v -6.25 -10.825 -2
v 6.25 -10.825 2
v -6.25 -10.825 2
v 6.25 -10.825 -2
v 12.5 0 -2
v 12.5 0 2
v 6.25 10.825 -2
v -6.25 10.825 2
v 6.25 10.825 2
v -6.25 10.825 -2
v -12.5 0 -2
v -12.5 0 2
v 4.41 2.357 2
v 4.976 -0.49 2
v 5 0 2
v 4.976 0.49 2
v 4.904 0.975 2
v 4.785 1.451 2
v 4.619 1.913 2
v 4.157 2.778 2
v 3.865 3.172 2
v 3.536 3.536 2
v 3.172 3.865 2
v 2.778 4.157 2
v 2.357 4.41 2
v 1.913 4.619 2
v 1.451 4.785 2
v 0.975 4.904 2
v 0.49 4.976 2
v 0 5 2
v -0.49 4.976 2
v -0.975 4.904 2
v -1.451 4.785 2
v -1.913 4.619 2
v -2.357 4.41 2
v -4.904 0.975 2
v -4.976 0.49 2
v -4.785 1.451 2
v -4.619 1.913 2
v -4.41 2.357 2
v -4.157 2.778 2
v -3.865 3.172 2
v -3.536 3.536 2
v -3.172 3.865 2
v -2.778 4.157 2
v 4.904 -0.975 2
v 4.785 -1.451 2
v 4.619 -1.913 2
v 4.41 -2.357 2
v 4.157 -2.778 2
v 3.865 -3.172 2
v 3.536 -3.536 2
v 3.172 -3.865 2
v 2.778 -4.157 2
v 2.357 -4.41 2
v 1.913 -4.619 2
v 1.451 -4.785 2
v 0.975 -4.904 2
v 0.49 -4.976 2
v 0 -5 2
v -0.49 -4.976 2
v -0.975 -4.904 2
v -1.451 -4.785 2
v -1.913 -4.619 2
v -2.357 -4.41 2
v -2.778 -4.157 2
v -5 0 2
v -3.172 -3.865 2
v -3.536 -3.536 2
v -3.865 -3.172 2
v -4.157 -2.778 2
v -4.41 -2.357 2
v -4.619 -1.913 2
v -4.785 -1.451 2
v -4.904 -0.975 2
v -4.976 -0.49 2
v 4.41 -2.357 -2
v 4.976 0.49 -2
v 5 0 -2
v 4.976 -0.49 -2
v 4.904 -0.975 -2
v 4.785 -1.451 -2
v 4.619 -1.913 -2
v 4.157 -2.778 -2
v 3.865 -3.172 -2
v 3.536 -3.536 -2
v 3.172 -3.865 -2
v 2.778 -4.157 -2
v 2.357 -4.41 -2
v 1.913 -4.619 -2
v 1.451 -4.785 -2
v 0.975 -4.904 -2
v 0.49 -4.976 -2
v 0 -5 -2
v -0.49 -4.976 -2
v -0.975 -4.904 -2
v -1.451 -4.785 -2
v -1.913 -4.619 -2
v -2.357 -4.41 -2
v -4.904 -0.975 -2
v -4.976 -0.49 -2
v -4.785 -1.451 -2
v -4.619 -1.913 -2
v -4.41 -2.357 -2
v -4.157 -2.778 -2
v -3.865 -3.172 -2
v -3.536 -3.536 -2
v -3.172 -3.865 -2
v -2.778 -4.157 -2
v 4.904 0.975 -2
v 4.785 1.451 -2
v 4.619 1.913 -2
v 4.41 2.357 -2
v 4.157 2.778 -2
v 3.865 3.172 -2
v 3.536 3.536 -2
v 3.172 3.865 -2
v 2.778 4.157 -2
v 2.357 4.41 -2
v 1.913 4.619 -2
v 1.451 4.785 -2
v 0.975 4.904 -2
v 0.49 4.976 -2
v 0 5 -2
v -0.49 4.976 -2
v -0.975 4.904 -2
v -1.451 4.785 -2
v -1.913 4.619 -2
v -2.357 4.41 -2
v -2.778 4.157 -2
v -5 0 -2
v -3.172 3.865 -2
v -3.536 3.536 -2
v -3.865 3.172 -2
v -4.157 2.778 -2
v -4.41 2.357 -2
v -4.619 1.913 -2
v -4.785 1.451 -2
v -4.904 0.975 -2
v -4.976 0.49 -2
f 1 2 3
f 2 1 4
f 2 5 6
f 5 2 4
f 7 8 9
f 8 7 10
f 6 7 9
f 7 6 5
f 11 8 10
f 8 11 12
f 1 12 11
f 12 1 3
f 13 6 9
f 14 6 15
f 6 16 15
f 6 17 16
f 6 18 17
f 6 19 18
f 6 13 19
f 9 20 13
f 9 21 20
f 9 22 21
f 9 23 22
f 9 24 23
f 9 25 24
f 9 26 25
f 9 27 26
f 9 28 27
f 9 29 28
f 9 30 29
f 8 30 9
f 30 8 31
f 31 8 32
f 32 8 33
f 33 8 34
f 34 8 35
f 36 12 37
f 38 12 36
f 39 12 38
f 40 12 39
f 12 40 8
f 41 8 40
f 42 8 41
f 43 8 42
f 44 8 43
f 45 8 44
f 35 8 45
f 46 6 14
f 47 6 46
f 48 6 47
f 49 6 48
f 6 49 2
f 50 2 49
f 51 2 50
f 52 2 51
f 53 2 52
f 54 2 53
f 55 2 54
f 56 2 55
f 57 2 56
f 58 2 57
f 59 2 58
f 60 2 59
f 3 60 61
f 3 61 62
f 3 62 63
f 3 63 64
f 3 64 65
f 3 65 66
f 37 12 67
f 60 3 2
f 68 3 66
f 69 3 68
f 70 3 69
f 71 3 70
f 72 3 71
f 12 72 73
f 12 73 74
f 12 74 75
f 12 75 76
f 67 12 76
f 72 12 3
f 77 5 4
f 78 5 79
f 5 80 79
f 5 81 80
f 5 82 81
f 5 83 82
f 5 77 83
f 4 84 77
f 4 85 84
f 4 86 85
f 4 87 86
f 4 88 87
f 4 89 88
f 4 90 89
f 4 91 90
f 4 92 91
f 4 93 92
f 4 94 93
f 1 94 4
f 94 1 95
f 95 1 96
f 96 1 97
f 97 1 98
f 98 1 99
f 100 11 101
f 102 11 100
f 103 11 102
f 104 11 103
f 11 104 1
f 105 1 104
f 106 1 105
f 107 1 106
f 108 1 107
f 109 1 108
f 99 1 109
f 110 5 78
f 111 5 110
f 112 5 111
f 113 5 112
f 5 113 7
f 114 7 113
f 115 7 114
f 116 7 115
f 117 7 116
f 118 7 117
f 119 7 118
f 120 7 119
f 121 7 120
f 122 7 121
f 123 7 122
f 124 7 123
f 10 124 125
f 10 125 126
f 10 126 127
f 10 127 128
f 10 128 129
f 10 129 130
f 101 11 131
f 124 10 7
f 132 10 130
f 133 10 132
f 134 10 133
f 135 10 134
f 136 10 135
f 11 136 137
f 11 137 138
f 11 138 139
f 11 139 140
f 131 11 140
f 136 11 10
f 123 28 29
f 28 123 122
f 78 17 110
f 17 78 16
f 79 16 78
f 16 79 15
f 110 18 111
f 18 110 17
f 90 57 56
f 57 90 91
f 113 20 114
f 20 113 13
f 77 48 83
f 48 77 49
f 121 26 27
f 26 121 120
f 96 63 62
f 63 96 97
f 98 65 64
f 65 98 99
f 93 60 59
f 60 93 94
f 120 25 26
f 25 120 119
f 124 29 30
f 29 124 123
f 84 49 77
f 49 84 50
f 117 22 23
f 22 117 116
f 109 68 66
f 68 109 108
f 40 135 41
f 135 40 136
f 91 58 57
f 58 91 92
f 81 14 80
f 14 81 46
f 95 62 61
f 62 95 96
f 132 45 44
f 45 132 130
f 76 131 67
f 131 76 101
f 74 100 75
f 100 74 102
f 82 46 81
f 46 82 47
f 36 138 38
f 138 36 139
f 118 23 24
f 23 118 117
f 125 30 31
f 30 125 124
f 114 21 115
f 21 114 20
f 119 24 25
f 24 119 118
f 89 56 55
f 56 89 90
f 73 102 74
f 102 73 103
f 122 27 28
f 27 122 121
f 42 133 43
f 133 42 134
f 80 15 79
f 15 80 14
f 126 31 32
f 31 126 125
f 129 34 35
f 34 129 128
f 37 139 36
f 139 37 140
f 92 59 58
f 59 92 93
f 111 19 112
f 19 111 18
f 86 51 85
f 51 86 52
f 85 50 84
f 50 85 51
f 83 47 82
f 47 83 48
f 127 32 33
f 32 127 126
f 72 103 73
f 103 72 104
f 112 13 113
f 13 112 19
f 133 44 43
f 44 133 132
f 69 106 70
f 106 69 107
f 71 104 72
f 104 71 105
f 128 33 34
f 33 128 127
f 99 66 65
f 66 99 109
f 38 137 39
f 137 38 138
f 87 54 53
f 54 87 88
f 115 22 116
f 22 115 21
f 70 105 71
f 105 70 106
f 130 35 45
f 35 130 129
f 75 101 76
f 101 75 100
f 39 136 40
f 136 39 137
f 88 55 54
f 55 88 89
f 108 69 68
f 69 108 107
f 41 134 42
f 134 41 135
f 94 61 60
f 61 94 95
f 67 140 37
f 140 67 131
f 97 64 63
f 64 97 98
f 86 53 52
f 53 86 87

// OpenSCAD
module hex_plate_with_hole() {
    difference() {
        // Hexagonal plate
        union() {
            // Main hexagonal body
            translate([0, 0, -2])
                cylinder(h=4, r=12.5, $fn=6);
            // Boss/recess feature
            translate([0, 0, -1])
                cylinder(h=2, r=10, $fn=6);
        }
        // Central circular through-hole
        translate([0, 0, -2])
            cylinder(h=8, r=5, $fn=64);
    }
}

hex_plate_with_hole();
